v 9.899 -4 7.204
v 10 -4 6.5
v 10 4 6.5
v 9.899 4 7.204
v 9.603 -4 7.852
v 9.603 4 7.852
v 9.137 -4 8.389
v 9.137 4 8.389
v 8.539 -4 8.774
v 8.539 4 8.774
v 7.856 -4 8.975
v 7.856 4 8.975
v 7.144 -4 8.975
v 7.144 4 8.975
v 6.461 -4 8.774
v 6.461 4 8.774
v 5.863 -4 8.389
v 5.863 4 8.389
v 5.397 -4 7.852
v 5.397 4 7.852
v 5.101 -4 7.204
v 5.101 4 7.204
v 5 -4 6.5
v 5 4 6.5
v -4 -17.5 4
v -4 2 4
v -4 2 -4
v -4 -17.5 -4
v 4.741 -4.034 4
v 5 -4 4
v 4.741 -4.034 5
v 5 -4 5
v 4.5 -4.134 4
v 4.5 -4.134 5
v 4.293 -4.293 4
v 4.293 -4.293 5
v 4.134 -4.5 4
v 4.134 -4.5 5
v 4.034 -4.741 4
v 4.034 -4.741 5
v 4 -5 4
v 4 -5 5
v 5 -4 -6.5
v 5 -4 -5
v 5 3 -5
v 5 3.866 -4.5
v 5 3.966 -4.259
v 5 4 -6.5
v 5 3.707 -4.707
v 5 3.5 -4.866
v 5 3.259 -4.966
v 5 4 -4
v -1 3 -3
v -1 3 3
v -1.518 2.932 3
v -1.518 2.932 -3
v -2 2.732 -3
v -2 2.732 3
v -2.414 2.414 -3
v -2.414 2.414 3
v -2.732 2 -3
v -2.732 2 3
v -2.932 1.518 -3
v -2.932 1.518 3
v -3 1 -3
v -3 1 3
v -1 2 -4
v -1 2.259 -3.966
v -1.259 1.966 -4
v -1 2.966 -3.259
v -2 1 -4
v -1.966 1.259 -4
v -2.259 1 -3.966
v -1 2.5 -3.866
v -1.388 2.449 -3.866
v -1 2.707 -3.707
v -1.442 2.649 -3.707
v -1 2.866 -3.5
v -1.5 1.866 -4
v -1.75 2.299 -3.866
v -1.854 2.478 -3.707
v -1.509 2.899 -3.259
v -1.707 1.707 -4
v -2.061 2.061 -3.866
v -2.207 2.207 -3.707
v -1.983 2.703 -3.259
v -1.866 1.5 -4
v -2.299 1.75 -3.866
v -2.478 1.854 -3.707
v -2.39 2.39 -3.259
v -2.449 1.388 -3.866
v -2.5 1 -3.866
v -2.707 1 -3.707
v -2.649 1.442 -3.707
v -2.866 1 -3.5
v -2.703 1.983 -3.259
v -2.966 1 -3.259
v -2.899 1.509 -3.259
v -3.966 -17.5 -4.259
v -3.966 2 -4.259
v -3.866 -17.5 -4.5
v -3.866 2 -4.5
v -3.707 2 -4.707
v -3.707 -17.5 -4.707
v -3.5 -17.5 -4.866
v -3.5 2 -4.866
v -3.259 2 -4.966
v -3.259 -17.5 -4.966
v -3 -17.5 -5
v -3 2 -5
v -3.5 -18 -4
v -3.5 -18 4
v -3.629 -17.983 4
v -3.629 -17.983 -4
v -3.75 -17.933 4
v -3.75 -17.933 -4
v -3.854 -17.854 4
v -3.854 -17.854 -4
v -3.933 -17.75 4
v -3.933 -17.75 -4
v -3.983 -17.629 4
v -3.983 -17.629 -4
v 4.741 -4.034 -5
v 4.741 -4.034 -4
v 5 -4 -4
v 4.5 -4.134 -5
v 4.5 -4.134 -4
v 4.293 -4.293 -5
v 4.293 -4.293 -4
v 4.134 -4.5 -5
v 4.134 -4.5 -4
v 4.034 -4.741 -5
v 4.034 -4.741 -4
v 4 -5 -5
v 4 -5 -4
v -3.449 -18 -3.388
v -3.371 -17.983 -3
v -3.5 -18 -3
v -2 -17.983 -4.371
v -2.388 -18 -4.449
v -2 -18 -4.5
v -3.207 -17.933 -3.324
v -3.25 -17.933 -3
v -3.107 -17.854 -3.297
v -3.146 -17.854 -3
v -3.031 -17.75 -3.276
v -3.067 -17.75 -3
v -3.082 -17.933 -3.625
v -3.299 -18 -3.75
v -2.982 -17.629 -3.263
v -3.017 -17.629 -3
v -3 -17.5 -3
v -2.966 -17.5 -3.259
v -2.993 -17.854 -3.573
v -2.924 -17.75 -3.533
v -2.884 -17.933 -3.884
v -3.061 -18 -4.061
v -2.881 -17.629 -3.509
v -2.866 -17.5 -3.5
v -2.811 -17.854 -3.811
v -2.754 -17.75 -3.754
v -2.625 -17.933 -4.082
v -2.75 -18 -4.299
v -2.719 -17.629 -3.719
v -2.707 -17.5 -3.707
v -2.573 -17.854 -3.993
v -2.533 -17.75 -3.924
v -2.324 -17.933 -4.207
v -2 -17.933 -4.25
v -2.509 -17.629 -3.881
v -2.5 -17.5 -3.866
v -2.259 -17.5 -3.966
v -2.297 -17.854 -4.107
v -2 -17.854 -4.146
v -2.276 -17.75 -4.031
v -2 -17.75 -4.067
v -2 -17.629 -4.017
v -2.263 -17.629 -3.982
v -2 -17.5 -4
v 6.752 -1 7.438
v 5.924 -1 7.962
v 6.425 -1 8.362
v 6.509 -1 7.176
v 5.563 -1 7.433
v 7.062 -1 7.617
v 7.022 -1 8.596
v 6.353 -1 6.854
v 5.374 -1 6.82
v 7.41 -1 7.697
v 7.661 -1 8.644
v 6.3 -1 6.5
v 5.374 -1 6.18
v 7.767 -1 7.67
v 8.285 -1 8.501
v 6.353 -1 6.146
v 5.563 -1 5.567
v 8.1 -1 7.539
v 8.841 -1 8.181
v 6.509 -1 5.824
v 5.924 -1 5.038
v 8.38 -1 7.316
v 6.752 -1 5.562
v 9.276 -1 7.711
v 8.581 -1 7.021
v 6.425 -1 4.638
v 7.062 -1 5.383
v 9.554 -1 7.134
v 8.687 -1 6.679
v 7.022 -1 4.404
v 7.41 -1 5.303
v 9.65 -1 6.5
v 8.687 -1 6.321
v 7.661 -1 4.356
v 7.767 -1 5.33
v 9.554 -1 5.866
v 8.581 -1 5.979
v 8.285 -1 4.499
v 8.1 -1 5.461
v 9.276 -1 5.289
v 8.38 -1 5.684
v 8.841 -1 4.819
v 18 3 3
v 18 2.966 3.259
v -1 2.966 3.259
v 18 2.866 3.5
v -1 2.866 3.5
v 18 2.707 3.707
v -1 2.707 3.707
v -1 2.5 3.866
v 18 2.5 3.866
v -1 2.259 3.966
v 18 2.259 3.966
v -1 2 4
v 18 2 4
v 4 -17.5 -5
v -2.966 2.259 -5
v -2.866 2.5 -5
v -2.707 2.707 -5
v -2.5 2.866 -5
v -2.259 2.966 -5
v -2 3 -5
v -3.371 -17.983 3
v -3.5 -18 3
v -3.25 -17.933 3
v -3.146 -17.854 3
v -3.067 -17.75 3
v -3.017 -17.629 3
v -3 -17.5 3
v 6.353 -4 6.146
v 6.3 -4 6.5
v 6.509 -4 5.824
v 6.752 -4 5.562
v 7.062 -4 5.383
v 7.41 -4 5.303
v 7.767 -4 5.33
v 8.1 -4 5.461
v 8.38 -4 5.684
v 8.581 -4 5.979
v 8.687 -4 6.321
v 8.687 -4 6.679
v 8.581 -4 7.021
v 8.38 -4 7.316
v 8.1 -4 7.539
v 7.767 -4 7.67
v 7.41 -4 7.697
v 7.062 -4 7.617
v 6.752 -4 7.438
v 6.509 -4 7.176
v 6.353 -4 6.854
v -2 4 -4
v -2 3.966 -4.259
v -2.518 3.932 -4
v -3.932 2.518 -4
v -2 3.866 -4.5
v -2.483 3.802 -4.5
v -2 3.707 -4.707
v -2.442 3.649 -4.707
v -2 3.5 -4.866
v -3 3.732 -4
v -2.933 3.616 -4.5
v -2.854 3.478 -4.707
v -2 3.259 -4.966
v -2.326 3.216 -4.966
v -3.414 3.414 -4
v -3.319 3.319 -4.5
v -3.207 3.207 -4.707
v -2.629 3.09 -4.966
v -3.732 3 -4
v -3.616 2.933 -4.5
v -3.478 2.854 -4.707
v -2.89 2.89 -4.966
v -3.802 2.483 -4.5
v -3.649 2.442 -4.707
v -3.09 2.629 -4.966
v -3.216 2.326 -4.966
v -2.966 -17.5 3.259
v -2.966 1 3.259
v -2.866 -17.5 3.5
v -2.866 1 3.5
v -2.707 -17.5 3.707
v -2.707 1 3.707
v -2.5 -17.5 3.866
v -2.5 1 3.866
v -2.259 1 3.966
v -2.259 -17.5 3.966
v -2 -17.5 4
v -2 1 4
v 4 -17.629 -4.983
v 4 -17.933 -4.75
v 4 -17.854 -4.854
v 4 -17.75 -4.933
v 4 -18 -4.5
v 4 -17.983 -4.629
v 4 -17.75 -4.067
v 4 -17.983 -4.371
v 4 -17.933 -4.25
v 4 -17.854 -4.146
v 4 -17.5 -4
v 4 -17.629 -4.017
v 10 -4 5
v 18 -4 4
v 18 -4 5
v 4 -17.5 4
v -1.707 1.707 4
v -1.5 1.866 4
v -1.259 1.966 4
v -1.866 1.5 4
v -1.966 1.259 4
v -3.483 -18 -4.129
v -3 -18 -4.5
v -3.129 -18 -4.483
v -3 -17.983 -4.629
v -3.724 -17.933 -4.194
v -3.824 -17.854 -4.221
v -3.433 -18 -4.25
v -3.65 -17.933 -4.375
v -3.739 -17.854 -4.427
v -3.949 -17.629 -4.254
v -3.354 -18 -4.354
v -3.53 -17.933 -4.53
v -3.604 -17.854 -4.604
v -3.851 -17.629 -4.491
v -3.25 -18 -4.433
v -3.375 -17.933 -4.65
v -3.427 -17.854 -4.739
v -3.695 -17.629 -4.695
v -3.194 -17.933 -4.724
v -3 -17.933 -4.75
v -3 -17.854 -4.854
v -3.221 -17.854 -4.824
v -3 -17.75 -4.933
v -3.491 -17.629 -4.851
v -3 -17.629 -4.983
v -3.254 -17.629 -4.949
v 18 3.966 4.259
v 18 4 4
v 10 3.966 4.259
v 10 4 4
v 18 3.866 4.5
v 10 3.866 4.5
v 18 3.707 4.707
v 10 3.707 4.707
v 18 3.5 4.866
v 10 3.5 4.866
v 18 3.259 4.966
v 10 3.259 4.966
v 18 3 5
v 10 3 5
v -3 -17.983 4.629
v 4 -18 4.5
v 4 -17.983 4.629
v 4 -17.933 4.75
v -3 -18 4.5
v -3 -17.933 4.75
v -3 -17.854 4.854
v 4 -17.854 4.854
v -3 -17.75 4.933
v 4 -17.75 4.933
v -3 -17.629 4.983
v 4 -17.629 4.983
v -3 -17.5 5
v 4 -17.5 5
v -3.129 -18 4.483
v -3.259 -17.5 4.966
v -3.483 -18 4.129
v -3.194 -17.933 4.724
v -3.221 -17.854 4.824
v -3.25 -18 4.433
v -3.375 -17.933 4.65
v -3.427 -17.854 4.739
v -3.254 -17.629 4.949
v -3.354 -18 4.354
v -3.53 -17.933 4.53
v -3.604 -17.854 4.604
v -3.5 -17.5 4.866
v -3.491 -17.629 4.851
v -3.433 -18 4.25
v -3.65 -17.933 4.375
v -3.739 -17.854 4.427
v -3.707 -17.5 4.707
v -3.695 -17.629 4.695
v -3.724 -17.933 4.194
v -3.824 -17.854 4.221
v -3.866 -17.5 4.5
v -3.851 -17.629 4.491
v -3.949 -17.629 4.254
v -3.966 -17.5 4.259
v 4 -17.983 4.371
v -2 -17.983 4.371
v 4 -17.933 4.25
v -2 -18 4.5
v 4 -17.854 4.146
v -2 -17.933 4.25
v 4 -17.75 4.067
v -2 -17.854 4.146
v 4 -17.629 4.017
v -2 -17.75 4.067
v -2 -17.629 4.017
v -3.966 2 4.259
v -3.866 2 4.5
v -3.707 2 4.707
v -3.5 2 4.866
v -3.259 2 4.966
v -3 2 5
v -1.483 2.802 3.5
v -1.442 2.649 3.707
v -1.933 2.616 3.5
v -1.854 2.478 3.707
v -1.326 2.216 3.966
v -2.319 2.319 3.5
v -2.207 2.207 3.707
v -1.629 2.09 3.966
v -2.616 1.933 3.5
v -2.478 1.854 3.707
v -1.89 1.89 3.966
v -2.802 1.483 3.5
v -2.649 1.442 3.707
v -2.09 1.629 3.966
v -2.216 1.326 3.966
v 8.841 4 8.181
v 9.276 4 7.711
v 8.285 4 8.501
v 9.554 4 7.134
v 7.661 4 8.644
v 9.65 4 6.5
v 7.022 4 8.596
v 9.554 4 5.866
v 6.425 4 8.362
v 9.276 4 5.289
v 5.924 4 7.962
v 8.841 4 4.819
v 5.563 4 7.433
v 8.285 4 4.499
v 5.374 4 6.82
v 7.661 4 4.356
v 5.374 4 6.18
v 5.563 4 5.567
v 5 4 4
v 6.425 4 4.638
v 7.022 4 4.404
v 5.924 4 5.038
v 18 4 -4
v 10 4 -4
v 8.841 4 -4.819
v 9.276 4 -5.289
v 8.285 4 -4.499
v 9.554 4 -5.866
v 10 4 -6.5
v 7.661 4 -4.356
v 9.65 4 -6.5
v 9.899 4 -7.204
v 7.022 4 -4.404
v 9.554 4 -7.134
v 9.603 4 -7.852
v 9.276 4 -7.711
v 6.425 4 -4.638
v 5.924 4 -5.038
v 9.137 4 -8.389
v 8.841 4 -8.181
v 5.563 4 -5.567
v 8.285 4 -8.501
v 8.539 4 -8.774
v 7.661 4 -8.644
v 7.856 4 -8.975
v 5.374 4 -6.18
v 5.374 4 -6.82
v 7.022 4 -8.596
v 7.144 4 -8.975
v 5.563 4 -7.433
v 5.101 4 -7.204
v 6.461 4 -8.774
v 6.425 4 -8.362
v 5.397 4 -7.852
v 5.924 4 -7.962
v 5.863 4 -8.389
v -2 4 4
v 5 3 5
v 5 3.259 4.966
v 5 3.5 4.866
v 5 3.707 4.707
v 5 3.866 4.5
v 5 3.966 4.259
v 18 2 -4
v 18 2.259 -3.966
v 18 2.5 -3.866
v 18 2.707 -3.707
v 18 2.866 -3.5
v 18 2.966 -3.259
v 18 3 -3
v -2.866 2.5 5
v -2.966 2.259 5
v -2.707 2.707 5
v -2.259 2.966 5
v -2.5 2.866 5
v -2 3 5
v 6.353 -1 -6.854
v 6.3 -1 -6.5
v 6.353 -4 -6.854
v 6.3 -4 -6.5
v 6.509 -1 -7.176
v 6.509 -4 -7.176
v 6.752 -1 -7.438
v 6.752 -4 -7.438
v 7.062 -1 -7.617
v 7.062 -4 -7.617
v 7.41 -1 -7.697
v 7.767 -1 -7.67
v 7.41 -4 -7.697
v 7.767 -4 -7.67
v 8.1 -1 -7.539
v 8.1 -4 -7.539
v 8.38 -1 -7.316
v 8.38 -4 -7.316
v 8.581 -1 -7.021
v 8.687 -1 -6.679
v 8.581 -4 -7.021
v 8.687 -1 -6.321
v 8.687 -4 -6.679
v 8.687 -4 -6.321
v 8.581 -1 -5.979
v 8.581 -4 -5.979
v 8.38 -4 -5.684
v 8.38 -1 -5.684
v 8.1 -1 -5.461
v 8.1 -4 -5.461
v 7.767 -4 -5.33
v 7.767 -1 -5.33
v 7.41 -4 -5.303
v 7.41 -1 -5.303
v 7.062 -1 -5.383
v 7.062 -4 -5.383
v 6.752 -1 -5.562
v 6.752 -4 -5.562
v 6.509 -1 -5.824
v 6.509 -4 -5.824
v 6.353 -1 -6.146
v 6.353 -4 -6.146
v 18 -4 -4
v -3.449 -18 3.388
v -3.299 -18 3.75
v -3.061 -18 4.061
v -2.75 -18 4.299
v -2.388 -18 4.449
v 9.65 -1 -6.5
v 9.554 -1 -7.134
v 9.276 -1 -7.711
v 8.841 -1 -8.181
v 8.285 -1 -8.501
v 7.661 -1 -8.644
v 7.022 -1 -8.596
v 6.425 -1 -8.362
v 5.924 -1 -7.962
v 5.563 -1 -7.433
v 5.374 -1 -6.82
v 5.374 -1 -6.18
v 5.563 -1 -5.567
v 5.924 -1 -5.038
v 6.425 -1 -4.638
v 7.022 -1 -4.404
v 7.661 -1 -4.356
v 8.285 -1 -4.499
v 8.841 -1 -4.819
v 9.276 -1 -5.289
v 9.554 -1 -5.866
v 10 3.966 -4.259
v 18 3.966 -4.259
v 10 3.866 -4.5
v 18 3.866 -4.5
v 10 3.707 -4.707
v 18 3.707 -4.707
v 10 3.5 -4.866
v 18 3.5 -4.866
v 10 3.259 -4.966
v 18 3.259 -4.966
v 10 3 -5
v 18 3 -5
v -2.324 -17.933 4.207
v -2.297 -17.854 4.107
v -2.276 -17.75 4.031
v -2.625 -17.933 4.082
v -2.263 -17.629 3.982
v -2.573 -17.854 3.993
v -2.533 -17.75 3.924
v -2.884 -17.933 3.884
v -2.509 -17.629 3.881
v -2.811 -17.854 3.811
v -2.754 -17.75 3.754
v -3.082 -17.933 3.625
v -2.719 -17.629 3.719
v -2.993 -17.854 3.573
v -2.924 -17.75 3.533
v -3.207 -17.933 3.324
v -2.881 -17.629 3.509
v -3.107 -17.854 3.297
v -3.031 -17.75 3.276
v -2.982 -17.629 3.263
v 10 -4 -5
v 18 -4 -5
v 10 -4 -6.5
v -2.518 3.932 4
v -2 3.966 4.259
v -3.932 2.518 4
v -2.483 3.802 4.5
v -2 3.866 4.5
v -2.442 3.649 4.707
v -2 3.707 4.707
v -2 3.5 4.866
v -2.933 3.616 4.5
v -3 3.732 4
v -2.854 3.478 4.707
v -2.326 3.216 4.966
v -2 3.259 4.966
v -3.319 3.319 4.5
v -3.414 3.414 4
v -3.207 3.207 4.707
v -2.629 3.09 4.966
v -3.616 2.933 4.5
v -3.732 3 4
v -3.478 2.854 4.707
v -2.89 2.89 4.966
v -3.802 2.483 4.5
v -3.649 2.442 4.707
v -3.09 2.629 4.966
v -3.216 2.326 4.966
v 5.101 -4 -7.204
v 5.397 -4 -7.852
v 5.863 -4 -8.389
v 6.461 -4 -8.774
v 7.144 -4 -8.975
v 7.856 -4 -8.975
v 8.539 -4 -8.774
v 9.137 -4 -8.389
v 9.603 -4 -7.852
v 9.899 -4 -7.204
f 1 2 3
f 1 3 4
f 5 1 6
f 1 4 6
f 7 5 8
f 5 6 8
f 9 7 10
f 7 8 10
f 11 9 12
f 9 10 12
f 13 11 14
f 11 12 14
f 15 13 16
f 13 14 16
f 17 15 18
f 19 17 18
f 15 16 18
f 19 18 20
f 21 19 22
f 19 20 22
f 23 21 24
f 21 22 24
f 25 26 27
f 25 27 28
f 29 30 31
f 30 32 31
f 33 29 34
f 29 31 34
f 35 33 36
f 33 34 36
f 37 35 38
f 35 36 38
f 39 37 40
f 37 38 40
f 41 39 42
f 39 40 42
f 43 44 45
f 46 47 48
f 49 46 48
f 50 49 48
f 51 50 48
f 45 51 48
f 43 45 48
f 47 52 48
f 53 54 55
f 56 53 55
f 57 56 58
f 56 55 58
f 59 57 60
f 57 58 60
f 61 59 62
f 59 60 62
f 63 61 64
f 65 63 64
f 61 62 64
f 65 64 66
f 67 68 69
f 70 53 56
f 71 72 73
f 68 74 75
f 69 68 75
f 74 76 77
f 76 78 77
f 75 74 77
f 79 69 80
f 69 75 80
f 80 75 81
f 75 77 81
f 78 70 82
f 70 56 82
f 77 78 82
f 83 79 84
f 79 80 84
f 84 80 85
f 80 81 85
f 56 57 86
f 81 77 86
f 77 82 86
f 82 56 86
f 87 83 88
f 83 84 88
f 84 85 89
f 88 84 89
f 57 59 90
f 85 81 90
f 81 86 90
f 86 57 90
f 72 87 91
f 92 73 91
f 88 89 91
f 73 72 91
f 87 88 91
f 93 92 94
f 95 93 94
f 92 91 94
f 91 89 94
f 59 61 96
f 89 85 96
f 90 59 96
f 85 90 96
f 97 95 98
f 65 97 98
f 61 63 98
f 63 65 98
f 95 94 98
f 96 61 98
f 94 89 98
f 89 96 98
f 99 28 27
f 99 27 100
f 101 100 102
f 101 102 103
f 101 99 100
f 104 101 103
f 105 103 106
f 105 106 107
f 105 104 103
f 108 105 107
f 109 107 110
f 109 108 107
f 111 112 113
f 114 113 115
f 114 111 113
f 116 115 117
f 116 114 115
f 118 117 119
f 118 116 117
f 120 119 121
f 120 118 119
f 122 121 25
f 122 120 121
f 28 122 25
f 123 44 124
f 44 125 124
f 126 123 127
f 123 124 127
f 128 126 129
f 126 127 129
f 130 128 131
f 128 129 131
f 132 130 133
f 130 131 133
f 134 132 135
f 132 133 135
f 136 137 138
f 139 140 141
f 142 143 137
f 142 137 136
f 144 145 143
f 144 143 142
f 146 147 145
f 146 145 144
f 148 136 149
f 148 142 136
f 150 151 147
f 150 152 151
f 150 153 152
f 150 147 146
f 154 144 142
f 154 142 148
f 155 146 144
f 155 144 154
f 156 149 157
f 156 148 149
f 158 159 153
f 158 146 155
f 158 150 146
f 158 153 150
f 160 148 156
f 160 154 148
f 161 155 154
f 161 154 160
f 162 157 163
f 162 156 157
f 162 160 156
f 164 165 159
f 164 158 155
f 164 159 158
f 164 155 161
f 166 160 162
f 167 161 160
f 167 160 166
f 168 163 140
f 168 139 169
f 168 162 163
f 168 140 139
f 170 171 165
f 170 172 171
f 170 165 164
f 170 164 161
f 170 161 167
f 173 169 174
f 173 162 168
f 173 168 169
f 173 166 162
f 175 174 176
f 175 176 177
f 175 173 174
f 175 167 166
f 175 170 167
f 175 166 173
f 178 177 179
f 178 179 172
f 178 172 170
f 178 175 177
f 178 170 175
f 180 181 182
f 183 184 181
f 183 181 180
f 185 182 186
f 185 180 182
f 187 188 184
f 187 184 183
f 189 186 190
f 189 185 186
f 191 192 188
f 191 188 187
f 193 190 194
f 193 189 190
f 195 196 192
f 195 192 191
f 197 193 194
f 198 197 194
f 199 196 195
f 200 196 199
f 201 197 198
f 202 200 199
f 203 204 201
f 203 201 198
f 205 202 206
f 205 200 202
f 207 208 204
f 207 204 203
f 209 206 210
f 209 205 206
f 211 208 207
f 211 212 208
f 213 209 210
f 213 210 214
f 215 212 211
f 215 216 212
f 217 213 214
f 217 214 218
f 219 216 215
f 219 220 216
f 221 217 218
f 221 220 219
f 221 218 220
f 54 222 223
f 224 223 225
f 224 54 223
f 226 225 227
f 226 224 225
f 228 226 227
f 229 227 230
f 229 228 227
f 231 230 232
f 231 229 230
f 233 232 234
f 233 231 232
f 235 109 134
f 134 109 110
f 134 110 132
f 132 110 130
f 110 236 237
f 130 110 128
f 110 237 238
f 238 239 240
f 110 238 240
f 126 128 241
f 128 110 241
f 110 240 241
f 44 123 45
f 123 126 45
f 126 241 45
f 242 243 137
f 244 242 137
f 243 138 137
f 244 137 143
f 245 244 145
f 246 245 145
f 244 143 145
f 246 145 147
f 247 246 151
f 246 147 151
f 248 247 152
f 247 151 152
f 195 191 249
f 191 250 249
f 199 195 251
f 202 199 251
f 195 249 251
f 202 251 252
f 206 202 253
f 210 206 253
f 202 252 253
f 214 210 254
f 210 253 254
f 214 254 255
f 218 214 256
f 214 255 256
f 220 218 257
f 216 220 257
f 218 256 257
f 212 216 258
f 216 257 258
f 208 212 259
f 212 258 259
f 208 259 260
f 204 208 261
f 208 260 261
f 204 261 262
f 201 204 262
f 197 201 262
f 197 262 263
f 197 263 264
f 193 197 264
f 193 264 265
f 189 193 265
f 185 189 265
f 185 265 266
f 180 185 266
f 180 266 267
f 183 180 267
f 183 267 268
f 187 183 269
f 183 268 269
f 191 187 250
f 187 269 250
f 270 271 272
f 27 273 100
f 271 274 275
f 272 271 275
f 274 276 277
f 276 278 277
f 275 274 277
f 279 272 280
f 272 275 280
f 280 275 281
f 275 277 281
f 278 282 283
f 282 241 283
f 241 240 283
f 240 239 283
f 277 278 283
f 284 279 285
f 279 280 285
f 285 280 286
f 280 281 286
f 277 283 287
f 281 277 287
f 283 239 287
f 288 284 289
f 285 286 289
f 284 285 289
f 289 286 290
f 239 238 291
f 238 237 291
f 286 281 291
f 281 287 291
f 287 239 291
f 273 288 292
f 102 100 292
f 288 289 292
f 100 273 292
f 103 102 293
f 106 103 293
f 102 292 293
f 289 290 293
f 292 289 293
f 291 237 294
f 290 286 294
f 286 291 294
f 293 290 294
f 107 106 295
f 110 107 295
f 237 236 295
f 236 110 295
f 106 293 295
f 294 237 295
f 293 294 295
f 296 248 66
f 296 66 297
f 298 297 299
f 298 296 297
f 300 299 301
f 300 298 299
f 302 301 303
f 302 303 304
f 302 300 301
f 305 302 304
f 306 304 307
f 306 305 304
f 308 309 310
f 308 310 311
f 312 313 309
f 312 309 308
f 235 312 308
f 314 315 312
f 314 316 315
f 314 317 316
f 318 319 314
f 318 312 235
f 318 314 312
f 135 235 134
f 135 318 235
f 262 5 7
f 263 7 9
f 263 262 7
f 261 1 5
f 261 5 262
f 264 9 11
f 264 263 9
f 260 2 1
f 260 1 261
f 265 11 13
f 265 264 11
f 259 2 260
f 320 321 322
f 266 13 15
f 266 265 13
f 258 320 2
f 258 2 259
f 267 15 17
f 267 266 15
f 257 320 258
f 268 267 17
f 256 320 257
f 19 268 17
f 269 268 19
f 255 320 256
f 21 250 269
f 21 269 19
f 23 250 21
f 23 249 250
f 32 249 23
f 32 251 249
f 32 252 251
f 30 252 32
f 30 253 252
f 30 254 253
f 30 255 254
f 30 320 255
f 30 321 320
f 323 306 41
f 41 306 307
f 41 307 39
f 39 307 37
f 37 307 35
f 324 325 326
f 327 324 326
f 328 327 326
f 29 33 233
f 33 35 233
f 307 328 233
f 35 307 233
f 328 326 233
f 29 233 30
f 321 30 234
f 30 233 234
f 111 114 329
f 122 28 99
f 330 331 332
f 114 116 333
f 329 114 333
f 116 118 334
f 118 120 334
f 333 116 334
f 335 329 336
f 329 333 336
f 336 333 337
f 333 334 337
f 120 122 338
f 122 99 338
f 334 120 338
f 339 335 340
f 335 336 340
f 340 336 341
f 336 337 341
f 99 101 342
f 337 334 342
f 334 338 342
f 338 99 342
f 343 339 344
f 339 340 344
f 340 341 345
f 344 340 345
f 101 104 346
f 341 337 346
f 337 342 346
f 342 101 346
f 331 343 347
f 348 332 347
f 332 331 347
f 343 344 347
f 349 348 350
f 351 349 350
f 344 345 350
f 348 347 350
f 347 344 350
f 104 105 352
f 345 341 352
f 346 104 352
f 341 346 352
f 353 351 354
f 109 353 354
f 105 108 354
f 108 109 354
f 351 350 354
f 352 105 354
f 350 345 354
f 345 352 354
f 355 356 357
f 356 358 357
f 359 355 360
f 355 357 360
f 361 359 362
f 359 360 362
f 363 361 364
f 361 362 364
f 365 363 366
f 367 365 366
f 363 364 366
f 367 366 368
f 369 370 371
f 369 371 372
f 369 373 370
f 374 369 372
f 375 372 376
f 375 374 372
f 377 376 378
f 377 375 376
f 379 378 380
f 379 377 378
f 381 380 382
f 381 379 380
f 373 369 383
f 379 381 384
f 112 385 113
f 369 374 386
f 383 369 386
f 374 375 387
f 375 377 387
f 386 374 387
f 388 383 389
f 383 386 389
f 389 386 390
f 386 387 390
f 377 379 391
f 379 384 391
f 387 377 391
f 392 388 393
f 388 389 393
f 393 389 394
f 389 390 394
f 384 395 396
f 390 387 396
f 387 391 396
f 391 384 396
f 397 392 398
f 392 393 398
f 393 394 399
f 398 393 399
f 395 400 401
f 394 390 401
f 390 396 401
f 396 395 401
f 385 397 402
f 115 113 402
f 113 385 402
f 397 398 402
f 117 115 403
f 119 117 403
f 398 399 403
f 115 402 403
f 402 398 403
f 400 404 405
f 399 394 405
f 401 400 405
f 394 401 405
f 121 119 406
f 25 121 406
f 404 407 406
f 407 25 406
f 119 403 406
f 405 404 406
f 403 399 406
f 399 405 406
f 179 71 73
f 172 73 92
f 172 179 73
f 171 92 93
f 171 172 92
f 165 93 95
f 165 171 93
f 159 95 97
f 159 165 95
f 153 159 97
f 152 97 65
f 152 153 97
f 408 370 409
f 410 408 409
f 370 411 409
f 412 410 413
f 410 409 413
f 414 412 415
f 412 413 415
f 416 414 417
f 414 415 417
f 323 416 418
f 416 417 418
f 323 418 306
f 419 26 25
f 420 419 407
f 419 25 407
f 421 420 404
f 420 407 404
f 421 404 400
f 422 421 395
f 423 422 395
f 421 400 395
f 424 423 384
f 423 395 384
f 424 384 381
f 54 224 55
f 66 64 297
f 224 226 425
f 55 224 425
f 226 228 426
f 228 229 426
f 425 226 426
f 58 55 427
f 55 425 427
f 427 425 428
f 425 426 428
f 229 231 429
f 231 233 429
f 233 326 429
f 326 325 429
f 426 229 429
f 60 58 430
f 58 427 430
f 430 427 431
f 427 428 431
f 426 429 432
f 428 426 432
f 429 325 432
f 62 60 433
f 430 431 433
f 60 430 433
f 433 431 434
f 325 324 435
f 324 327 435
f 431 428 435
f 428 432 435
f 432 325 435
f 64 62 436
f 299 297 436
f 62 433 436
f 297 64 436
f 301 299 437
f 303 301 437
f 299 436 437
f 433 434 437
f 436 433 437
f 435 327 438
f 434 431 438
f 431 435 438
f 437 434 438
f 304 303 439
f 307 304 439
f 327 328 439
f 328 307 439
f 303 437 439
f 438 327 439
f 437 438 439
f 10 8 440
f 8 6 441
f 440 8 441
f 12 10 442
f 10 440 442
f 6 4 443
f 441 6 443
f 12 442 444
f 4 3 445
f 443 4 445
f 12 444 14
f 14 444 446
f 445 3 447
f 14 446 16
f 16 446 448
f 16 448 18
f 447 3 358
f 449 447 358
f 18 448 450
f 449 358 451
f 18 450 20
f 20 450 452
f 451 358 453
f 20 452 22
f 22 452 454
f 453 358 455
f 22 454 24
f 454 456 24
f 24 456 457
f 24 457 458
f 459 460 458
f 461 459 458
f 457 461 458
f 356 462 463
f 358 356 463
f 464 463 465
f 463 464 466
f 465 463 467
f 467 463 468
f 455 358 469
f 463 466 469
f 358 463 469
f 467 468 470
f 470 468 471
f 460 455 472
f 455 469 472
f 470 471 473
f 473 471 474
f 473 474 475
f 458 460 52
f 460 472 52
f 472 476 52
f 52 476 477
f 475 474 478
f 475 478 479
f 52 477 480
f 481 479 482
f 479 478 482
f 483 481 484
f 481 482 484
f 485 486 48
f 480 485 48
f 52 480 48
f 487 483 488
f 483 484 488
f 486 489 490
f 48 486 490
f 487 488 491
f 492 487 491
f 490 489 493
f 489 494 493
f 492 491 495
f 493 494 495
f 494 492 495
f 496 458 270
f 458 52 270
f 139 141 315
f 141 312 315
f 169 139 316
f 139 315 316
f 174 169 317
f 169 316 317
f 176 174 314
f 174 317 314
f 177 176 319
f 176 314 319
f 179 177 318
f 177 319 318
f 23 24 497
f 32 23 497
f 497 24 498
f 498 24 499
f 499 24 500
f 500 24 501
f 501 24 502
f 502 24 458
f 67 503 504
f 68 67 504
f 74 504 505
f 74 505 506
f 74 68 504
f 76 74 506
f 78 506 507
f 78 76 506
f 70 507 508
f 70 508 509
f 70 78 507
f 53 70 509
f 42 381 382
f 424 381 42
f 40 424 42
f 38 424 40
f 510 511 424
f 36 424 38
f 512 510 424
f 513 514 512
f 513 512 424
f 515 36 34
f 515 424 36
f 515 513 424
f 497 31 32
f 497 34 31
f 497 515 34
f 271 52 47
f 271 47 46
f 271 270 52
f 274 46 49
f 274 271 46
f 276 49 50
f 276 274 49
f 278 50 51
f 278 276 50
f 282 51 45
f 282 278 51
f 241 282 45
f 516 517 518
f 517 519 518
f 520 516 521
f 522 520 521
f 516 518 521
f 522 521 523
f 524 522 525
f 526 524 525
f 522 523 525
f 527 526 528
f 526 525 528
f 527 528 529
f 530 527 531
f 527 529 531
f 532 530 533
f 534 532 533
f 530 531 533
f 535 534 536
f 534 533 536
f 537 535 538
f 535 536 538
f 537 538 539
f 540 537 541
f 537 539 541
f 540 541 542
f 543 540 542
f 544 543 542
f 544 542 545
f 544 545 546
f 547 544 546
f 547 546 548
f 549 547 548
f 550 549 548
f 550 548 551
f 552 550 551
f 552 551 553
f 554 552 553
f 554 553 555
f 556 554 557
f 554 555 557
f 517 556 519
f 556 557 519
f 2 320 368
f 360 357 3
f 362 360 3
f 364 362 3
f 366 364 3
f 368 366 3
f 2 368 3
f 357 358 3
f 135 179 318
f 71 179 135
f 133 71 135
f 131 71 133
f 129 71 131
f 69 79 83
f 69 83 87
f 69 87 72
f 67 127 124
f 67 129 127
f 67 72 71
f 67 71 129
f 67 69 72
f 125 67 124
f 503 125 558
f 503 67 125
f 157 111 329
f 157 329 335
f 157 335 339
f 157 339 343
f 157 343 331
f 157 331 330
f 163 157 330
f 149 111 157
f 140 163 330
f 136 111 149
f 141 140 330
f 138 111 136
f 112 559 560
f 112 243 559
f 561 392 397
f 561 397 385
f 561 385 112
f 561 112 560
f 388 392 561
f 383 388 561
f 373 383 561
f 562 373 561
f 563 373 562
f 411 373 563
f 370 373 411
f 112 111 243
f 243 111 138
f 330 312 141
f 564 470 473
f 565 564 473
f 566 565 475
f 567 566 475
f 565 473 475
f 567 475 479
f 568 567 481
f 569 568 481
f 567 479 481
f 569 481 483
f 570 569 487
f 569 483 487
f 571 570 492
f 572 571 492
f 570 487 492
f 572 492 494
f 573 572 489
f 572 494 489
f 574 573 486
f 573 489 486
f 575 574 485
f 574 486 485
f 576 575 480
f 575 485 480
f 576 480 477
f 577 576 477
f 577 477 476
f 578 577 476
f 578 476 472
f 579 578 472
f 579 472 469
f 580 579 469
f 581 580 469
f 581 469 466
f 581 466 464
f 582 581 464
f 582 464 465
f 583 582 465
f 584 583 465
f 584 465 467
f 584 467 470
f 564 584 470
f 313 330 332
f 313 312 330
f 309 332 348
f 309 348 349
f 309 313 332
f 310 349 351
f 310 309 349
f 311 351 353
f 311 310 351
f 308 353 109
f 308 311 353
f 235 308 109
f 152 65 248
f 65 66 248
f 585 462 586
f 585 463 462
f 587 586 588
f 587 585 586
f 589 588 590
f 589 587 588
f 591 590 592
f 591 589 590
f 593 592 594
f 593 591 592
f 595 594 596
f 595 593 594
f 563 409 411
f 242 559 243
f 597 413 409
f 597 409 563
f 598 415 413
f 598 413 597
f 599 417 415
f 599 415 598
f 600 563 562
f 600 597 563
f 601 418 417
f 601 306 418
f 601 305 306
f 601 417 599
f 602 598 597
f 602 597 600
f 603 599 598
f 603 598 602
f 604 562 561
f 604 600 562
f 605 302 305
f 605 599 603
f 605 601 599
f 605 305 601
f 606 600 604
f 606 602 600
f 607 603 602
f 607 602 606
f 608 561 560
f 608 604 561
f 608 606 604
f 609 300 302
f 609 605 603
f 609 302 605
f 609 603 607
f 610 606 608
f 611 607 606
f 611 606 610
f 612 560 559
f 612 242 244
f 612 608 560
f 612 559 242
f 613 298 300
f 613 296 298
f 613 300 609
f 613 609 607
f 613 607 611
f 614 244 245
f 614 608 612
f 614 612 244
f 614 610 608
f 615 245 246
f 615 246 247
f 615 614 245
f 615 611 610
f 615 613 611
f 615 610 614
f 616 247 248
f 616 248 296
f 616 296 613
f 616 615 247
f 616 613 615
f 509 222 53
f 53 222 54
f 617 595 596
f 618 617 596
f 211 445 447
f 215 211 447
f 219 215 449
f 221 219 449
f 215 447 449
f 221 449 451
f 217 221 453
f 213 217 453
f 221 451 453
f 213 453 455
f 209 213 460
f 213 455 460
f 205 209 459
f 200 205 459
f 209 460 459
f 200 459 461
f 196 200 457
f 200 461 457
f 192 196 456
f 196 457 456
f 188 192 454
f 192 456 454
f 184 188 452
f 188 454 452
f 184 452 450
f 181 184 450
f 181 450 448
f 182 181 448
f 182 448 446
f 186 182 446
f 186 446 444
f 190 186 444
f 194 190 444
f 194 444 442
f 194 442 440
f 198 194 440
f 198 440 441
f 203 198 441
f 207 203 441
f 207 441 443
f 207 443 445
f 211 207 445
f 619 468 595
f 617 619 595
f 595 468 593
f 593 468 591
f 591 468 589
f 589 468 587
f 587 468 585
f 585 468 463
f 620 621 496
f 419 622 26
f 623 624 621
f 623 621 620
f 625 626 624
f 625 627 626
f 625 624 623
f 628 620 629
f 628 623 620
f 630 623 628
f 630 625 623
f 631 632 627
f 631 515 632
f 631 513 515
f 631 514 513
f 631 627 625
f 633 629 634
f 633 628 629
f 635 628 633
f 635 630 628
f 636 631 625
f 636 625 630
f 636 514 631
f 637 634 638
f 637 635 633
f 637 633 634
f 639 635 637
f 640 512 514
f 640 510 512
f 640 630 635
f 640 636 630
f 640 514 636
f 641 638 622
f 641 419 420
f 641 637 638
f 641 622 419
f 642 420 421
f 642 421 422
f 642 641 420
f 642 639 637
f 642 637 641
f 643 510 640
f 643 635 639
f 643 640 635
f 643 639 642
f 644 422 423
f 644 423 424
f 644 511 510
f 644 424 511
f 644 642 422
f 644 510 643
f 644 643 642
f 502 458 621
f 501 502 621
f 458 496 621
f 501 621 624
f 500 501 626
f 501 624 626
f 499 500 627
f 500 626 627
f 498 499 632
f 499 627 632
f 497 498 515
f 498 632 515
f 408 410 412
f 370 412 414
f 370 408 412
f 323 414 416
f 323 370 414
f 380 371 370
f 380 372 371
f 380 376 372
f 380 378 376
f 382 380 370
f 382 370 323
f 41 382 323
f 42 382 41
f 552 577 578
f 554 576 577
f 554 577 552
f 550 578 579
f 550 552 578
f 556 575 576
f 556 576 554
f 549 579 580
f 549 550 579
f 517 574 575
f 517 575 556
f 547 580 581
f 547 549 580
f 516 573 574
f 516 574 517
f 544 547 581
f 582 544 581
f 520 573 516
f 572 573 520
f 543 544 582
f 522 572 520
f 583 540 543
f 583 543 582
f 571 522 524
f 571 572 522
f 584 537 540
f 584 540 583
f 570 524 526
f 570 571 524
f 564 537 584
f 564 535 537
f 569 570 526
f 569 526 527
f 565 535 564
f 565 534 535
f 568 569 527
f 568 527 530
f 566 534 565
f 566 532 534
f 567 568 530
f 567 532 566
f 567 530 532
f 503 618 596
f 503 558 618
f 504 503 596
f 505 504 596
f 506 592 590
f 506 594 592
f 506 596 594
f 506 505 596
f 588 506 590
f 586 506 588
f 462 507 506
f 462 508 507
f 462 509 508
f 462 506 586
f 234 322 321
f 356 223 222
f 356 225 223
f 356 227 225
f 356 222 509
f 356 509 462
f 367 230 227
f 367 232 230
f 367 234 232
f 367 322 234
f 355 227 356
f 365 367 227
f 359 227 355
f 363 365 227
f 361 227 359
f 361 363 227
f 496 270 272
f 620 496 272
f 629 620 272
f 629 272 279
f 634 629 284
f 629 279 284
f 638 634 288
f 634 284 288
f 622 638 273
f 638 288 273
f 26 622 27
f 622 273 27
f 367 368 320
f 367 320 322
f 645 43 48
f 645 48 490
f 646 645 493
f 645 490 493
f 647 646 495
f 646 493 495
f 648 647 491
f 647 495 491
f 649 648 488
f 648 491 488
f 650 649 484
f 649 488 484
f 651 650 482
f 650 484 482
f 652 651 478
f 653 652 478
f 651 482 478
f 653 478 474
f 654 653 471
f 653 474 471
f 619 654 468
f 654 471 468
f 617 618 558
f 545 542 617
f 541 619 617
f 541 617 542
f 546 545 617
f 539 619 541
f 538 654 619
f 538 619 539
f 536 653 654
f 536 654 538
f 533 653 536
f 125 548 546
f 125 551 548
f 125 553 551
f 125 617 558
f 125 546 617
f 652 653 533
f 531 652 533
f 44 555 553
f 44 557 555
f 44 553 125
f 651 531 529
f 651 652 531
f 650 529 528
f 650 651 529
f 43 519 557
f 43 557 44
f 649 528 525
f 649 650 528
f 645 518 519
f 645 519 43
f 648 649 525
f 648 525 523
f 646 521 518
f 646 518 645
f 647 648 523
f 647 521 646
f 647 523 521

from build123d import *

# Parameters (mm, degrees)
EXTRUDE_1_DEPTH           = 5
EXTRUDE_1_2_DEPTH         = 8
CUT_EXTRUDE_1_DEPTH       = 4
FILLET_1_R                = 2
HOLE_WIZARD_1_D           = 2.4
HOLE_WIZARD_1_DEPTH       = 15
HOLE_WIZARD_1_CBORE_D     = 4.3
HOLE_WIZARD_1_CBORE_DEPTH = 5
HOLE_WIZARD_1_TIP         = 0.721032743
FILLET_2_R                = 1
FILLET_3_R                = 1
FILLET_4_R                = 1
FILLET_5_R                = 0.5
FILLET_6_R                = 0.5


with BuildPart() as part:
    # 草图1 → Extrude 1 (new, symmetric)
    with BuildSketch(Plane.XY):
        Polygon((4, -18), (4, -4), (18, -4), (18, 4), (-4, 4), (-4, -18), align=None)
    extrude(amount=EXTRUDE_1_DEPTH, both=True)

    # 草图3 → Extrude 1 2 (add)
    with BuildSketch(Plane(origin=(0, 4, 0), x_dir=(1, 0, 0), z_dir=(0, 1, 0))):
        with BuildLine():
            Line((10, 6.5), (10, -6.5))
            ThreePointArc((10, -6.5), (7.5, -9), (5, -6.5))
            Line((5, -6.5), (5, 6.5))
            ThreePointArc((5, 6.5), (7.5, 9), (10, 6.5))
        make_face()
    extrude(amount=-EXTRUDE_1_2_DEPTH)

    # 草图2 → 切除-拉伸1 (cut, symmetric)
    with BuildSketch(Plane.XY):
        Polygon((18, 3), (-3, 3), (-3, -18), (4, -18), (4, -4), (18, -4), align=None)
    extrude(amount=CUT_EXTRUDE_1_DEPTH, both=True, mode=Mode.SUBTRACT)

    # 圆角1
    fillet_1_edges = [part.edges().sort_by_distance(p)[0] for p in [
        (-3, 3, 0),
        (-4, 4, 0),
    ]]
    fillet(fillet_1_edges, radius=FILLET_1_R)

    # 打孔尺寸(%根据)内六角圆柱头螺钉的类型1
    with Locations(Plane(origin=(0, 4, 0), x_dir=(1, 0, 0), z_dir=(0, 1, 0))):
        with Locations((7.5, 6.5), (7.5, -6.5)):
            CounterBoreHole(HOLE_WIZARD_1_D / 2, HOLE_WIZARD_1_CBORE_D / 2, HOLE_WIZARD_1_CBORE_DEPTH, depth=HOLE_WIZARD_1_DEPTH)
            with Locations((0, 0, -(HOLE_WIZARD_1_DEPTH + HOLE_WIZARD_1_TIP / 2))):  # 118° drill point
                Cone(0, HOLE_WIZARD_1_D / 2, HOLE_WIZARD_1_TIP, mode=Mode.SUBTRACT)

    # 圆角2
    fillet_2_edges = [part.edges().sort_by_distance(p)[0] for p in [
        (1.5, 4, -5),
        (1.5, 4, 5),
        (8.5, 3, -4),
        (8.5, 3, 4),
        (-4, -8, -5),
        (-4, -8, 5),
        (-3.414213562, 3.414213562, -5),
        (-3.414213562, 3.414213562, 5),
        (-3, -8.5, 4),
        (-3, -8.5, -4),
        (-2.414213562, 2.414213562, 4),
        (-2.414213562, 2.414213562, -4),
    ]]
    fillet(fillet_2_edges, radius=FILLET_2_R)

    # 圆角3
    fillet_3_edges = [part.edges().sort_by_distance(p)[0] for p in [
        (14, 4, 5),
        (14, 4, -5),
    ]]
    fillet(fillet_3_edges, radius=FILLET_3_R)

    # 圆角4
    fillet_4_edges = [part.edges().sort_by_distance(p)[0] for p in [
        (4, -4, -4.5),
        (4, -4, 4.5),
    ]]
    fillet(fillet_4_edges, radius=FILLET_4_R)

    # 圆角5
    fillet_5_edges = [part.edges().sort_by_distance(p)[0] for p in [
        (-4, -18, 0),
        (-3.707106781, -18, -4.707106781),
        (-3.707106781, -18, 4.707106781),
        (0.5, -18, -5),
        (0.5, -18, 5),
    ]]
    fillet(fillet_5_edges, radius=FILLET_5_R)

    # 圆角6
    fillet_6_edges = [part.edges().sort_by_distance(p)[0] for p in [
        (1, -18, -4),
        (-2.707106781, -18, -3.707106781),
        (1, -18, 4),
        (-2.707106781, -18, 3.707106781),
        (-3, -18, 0),
    ]]
    fillet(fillet_6_edges, radius=FILLET_6_R - 0.0001)  # a hair under: the kernel refuses the full size


solid = part.part
